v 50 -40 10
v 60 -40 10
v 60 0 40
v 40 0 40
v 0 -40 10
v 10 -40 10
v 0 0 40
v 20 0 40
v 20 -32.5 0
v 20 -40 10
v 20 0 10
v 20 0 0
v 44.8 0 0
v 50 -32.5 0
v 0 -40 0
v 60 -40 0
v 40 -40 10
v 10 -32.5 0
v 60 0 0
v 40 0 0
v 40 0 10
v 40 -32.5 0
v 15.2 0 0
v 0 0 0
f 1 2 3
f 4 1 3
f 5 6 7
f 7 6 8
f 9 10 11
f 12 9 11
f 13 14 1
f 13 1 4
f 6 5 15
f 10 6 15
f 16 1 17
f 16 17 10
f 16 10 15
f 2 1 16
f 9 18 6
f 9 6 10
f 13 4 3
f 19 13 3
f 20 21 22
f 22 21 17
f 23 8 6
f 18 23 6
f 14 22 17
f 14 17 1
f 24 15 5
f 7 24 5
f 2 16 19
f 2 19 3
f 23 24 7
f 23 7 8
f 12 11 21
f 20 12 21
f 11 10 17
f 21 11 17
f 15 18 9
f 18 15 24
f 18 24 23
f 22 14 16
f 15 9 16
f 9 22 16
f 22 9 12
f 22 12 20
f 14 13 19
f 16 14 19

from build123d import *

# Parameters (mm, degrees)
F0_W     = 60
F0_H     = 40
F1_DEPTH = 40
F2_W     = 20
F2_H     = 30
F3_DEPTH = 40
F5_DEPTH = 60
F8_DEPTH = 40


# Not quite as in the source:
# - a feature of the source that left no trace in its solid (it failed there, or was rolled back) is left out


with BuildPart() as f1:
    # F0 (on Front) → F1 (new body)
    with BuildSketch(Plane.XZ):
        with Locations((30, 20)):
            Rectangle(F0_W, F0_H)
    extrude(amount=F1_DEPTH)

    # F2 (on face) → F3 (cut)
    with BuildSketch(Plane.XZ.offset(40)):
        with Locations((30, 25)):
            Rectangle(F2_W, F2_H)
    extrude(amount=-F3_DEPTH, mode=Mode.SUBTRACT)

    # F4 (on face) → F5 (cut)
    with BuildSketch(Plane.YZ.offset(60)):
        Polygon((-40, 40), (-40, 10), (0, 40), align=None)
    extrude(amount=-F5_DEPTH, mode=Mode.SUBTRACT)

    # F6 (on face) + F7 (on face) → F8 (cut)
    with BuildSketch(Plane(origin=(0, -19.2, 25.6), x_dir=(1, 0, 0), z_dir=(0, -0.6, 0.8))):
        Polygon((20, -26), (20, 24), (10, -26), align=None)
    with BuildSketch(Plane(origin=(0, -19.2, 25.6), x_dir=(1, 0, 0), z_dir=(0, -0.6, 0.8))):
        Polygon((50, -26), (40, 24), (40, -26), align=None)
    extrude(amount=-F8_DEPTH, mode=Mode.SUBTRACT)


solid = f1.part
